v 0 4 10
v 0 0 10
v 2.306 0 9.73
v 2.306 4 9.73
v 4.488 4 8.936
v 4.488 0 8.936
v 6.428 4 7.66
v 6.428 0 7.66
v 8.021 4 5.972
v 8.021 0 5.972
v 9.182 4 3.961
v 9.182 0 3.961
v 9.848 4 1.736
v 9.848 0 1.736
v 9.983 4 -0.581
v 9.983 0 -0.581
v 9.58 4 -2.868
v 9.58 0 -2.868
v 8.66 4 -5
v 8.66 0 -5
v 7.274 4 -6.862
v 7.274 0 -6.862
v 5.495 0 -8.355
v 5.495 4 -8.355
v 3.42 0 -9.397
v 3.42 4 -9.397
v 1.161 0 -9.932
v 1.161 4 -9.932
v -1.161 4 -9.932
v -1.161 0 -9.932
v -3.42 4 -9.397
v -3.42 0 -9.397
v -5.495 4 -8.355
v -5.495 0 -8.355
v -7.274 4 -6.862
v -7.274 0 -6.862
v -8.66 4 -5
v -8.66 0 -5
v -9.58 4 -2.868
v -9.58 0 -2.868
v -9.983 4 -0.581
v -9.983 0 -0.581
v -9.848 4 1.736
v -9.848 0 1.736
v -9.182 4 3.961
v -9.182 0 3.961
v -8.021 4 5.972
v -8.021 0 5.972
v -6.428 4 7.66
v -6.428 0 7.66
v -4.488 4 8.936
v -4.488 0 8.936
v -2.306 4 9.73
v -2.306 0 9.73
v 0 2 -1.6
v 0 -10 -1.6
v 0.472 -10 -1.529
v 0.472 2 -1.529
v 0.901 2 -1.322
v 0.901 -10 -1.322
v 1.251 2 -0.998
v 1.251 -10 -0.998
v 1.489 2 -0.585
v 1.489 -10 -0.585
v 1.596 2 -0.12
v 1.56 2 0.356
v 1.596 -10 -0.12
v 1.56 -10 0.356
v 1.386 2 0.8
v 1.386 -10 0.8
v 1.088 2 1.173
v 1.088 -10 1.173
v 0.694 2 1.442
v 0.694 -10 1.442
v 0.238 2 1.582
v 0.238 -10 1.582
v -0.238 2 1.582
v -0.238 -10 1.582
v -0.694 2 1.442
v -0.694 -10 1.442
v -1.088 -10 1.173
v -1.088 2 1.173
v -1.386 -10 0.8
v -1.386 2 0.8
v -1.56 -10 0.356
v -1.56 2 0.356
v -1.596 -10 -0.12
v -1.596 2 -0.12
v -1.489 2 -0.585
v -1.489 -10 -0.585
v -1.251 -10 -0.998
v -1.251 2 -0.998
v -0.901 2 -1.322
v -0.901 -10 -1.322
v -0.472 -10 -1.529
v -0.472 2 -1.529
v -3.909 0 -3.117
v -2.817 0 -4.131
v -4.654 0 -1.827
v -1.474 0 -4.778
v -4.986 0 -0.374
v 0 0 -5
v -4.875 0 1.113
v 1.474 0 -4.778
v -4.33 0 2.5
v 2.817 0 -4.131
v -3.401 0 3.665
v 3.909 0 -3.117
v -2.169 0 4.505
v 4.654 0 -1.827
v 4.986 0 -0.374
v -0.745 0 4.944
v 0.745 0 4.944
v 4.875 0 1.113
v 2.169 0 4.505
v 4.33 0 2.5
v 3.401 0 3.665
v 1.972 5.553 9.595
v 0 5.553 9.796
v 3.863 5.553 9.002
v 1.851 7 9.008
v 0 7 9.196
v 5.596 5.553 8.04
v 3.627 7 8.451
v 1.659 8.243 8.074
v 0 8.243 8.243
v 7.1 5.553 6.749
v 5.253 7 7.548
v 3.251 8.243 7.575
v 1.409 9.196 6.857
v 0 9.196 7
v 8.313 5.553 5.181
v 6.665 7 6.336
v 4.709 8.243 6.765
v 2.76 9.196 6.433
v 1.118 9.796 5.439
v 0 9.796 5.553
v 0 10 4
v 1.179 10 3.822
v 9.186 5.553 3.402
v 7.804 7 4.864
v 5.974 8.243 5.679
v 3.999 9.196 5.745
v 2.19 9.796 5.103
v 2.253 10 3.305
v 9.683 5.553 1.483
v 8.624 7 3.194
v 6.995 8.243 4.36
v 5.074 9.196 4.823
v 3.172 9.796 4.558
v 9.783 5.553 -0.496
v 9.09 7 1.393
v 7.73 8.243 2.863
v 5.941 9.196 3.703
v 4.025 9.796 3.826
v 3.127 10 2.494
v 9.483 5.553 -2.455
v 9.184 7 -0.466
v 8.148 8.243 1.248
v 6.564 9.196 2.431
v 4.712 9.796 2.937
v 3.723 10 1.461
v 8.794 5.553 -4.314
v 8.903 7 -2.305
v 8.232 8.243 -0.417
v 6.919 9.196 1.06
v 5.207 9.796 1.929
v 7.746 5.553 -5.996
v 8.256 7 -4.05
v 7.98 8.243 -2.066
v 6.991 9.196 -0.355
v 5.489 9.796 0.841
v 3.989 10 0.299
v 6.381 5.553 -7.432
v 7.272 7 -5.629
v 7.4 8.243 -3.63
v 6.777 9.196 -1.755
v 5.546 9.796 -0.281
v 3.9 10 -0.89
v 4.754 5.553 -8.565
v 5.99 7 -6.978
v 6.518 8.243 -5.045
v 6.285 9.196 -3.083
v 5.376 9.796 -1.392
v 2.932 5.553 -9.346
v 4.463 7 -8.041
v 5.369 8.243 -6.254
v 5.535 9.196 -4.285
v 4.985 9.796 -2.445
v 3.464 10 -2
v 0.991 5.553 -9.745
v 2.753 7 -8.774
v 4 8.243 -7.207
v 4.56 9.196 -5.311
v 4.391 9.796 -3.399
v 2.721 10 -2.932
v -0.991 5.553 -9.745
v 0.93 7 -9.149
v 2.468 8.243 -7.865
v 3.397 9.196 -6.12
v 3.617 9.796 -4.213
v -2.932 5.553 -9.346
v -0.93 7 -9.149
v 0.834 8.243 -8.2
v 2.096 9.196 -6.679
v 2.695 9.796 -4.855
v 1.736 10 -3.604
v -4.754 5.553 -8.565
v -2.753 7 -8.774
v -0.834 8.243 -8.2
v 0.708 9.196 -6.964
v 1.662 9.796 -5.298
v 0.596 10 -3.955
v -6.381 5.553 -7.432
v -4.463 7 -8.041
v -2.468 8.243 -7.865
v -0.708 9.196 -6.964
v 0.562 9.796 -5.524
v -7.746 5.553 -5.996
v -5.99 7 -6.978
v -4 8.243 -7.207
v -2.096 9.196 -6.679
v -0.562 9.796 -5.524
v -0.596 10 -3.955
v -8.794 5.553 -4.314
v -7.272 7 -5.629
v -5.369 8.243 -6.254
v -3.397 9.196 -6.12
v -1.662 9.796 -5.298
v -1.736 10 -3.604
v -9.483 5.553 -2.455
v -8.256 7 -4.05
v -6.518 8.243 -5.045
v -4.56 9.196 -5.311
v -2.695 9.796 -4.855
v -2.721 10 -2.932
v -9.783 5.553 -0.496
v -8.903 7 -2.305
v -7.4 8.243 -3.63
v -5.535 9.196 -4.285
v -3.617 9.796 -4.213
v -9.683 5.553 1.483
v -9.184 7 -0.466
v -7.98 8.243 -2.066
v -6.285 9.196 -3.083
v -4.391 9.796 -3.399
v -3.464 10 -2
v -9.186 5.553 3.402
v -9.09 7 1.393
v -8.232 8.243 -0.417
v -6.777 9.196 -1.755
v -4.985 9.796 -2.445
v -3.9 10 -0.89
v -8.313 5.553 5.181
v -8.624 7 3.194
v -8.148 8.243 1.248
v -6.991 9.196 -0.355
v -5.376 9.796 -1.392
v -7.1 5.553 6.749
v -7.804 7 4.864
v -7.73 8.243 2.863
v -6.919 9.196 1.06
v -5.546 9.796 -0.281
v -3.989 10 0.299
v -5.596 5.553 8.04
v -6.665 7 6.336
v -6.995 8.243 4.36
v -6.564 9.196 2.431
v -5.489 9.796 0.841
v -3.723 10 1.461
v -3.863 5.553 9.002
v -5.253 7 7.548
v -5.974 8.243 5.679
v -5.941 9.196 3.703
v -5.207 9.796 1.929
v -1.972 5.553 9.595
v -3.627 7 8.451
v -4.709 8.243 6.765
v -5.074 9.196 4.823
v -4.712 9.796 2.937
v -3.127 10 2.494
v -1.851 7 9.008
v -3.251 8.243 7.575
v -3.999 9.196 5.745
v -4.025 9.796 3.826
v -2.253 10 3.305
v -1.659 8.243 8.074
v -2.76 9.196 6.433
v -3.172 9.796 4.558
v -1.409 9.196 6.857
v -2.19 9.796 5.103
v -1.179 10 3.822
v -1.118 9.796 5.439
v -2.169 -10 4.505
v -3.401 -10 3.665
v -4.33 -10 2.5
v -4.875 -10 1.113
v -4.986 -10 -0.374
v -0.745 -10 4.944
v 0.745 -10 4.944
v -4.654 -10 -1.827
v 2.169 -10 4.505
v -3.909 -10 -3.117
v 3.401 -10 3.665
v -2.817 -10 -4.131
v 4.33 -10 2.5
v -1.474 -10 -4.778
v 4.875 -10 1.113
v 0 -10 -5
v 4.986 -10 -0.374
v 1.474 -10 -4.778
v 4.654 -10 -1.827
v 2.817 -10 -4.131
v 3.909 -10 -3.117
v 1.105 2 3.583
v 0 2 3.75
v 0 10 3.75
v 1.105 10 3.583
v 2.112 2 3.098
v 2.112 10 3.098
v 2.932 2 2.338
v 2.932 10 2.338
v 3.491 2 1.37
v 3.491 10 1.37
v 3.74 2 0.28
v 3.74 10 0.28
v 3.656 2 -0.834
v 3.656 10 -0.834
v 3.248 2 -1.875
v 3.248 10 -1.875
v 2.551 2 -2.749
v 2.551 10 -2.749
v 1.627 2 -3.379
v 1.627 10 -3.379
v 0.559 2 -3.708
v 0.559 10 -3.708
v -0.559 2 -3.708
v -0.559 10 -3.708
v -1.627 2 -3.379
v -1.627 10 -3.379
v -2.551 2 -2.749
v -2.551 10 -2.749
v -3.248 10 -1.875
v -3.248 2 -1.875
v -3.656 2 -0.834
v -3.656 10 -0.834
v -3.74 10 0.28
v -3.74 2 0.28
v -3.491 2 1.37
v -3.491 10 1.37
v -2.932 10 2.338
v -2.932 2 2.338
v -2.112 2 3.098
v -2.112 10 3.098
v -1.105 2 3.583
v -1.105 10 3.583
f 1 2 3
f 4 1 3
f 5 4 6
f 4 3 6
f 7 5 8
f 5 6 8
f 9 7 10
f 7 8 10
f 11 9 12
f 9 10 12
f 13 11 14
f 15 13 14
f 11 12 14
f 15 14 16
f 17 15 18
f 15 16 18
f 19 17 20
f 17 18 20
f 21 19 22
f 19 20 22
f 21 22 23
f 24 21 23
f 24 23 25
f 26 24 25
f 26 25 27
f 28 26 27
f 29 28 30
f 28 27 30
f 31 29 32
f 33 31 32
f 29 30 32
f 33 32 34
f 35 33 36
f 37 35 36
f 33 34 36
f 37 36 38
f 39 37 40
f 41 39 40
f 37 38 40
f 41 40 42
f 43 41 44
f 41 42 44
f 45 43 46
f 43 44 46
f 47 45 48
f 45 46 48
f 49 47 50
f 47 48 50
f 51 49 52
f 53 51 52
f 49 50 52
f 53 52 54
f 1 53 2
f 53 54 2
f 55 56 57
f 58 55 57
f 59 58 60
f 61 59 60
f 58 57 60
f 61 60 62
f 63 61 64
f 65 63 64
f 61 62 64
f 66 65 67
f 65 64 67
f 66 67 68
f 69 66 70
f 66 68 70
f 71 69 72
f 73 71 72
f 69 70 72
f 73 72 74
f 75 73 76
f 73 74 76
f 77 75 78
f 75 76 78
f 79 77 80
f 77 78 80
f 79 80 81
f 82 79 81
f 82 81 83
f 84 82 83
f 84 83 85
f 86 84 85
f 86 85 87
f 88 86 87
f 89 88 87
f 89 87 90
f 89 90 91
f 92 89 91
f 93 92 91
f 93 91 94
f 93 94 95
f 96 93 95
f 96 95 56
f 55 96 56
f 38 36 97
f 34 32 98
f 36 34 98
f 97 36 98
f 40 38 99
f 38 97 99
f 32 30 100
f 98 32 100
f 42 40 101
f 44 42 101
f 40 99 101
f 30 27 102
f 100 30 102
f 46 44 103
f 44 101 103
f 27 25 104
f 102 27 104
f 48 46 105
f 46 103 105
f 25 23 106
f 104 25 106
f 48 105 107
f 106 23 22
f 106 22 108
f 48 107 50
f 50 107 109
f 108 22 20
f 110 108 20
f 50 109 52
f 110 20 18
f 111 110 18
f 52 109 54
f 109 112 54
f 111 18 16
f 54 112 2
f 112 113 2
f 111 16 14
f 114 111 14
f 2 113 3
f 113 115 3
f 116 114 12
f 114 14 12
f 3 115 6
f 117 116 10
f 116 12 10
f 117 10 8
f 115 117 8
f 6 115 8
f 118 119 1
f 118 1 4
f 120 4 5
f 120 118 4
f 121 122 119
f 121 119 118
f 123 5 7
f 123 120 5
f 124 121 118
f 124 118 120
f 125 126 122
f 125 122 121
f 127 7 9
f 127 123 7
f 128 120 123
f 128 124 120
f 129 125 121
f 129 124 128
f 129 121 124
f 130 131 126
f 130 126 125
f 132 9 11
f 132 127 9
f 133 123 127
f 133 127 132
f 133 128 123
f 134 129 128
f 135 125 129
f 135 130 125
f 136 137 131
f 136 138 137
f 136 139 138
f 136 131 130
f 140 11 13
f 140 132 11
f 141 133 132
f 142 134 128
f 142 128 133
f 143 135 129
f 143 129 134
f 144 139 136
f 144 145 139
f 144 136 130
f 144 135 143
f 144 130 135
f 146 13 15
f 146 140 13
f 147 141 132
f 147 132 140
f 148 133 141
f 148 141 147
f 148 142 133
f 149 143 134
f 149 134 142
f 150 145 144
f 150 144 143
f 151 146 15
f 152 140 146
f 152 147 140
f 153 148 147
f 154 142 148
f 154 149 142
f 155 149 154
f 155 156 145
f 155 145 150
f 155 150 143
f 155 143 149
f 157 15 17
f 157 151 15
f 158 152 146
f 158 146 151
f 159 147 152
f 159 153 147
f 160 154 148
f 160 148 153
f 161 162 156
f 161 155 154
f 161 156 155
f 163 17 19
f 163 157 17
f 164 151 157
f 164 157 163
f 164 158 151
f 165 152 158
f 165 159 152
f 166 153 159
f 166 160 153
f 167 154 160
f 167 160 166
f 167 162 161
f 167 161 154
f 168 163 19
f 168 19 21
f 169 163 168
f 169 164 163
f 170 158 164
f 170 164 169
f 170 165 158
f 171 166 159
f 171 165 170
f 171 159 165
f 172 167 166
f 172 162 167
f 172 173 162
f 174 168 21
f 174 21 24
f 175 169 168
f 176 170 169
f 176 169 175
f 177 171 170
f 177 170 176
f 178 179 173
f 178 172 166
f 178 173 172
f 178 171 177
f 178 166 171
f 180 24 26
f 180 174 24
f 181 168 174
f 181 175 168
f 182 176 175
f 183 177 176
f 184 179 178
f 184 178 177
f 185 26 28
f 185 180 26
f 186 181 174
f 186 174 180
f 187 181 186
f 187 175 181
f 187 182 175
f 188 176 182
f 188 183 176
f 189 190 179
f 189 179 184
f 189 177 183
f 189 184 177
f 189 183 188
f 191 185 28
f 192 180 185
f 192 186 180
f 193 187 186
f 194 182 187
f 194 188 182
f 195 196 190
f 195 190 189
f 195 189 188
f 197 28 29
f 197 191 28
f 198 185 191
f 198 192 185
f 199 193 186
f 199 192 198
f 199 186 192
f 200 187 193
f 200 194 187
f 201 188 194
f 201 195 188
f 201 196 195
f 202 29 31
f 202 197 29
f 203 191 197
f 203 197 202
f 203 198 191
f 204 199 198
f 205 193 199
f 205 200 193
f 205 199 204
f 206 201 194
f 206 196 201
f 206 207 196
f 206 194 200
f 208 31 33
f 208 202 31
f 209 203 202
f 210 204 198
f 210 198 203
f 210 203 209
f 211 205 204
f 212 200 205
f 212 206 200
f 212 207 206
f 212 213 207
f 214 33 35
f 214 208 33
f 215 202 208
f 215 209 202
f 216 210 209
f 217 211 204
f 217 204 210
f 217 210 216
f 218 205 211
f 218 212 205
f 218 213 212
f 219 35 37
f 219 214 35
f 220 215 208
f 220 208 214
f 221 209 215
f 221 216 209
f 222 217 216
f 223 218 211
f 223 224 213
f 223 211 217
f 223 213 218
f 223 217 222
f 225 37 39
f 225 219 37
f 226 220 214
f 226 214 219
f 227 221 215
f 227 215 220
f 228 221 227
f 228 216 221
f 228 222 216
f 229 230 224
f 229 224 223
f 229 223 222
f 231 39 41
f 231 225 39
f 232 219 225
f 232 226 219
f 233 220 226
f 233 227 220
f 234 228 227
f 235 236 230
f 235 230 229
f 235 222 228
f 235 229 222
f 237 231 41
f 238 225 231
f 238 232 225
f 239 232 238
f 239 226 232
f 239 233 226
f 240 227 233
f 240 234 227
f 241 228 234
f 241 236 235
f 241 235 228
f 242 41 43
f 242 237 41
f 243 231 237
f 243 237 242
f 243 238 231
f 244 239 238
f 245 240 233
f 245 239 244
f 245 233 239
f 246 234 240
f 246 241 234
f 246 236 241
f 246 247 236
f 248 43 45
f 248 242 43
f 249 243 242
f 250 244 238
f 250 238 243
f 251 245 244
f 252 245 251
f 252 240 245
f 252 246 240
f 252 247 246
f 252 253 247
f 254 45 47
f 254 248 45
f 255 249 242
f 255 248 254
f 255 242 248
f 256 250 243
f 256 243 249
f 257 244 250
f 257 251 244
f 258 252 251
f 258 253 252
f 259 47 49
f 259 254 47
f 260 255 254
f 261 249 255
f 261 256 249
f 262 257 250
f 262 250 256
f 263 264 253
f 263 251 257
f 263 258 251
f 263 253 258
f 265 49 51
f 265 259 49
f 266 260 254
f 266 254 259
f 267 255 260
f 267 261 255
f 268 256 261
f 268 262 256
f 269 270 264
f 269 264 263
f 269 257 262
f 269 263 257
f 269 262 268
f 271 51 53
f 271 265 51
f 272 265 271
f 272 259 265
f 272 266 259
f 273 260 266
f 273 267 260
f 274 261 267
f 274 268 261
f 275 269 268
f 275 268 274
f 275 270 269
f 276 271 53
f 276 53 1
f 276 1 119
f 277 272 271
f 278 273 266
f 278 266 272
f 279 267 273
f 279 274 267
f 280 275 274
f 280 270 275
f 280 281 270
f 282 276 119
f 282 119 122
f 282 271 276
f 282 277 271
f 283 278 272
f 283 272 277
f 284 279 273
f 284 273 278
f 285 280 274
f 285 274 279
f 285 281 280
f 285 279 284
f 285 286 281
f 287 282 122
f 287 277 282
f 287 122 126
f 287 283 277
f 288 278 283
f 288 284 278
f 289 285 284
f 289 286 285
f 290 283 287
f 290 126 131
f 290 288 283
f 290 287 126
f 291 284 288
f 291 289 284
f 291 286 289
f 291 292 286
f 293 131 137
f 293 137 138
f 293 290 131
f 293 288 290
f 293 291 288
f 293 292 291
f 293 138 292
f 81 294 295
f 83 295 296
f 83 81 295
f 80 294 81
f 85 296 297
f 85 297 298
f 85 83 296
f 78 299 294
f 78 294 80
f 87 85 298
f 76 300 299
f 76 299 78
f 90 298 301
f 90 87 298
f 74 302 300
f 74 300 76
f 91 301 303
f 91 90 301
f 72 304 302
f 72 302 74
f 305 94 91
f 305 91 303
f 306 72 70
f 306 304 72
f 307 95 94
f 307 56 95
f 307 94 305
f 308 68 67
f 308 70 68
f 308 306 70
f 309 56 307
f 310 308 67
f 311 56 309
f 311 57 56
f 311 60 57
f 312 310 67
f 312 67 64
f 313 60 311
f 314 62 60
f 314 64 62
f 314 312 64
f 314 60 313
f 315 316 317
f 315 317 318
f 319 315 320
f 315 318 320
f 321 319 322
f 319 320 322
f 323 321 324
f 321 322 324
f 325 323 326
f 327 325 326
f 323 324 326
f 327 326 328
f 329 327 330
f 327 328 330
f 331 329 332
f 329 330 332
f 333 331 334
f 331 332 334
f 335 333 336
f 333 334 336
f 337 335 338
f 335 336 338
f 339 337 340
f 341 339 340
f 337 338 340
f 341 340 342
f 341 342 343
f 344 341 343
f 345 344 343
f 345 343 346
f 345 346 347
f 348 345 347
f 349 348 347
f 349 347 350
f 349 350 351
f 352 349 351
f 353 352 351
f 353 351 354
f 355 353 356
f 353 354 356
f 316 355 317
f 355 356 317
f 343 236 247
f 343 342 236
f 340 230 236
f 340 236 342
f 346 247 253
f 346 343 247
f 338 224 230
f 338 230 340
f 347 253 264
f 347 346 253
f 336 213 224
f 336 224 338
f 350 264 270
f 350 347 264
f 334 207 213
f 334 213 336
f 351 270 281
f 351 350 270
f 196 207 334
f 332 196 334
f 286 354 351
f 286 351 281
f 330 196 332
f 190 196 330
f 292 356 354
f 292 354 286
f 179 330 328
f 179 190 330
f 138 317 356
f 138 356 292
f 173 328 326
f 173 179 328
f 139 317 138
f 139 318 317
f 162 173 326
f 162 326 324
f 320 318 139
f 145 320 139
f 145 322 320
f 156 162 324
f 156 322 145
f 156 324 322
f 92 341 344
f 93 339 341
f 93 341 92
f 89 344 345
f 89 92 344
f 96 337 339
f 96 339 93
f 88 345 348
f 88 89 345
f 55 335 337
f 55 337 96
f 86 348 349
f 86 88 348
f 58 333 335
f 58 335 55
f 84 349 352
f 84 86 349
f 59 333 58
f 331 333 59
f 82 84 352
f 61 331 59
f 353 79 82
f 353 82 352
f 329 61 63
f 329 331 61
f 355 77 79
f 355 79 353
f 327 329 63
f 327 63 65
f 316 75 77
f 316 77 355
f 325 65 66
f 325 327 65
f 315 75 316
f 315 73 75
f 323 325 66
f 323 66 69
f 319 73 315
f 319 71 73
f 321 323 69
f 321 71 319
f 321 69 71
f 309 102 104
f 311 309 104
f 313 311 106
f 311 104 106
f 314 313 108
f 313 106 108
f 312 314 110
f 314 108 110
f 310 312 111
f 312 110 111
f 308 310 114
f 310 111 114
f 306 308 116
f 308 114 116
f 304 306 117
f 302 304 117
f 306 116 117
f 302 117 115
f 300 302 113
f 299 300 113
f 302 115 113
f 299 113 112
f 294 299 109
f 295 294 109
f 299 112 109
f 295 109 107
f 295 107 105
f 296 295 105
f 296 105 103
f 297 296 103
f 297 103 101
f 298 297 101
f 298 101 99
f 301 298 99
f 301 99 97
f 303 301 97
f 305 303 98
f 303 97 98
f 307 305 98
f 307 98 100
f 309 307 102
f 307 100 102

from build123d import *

# Parameters (mm, degrees)
SZKIC1_R                    = 10
DODANIE_WYCI_GNI_CIE1_DEPTH = 10
ZAOKR_GLENIE1_R             = 6
SZKIC2_R                    = 5
DODANIE_WYCI_GNI_CIE2_DEPTH = 10
SZKIC3_R                    = 3.75
WYTNIJ_WYCI_GNI_CIE1_DEPTH  = 8
WYTNIJ_WYCI_GNI_CIE2_REACH  = 26.495
SZKIC4_R                    = 1.6


with BuildPart() as part:
    # Szkic1 → Dodanie-wyciągnięcie1 (new body)
    with BuildSketch(Plane(origin=(0, 0, 0), x_dir=(1, 0, 0), z_dir=(0, 1, 0))):
        with Locations(Location((0, 0, 0), (0, 0, 270))):
            Circle(SZKIC1_R)
    extrude(amount=DODANIE_WYCI_GNI_CIE1_DEPTH)

    # Zaokrąglenie1
    zaokr_glenie1_edges = [part.edges().sort_by_distance(p)[0] for p in [
        (0, 10, -10),
    ]]
    fillet(zaokr_glenie1_edges, radius=ZAOKR_GLENIE1_R)

    # Szkic2 → Dodanie-wyciągnięcie2 (add)
    with BuildSketch(Plane.XZ):
        with Locations(Location((0, 0, 0), (0, 0, 270))):
            Circle(SZKIC2_R)
    extrude(amount=DODANIE_WYCI_GNI_CIE2_DEPTH)

    # Szkic3 → Wytnij-wyciągnięcie1 (cut)
    with BuildSketch(Plane(origin=(0, 10, 0), x_dir=(1, 0, 0), z_dir=(0, 1, 0))):
        with Locations(Location((0, 0, 0), (0, 0, 270))):
            Circle(SZKIC3_R)
    extrude(amount=-WYTNIJ_WYCI_GNI_CIE1_DEPTH, mode=Mode.SUBTRACT)

    # Szkic4 → Wytnij-wyciągnięcie2 (cut, up to next)
    with BuildSketch(Plane.XZ.offset(10), mode=Mode.PRIVATE) as wytnij_wyci_gni_cie2_sk1:
        with Locations(Location((0, 0, 0), (0, 0, 270))):
            Circle(SZKIC4_R)
    wytnij_wyci_gni_cie2_tool1 = extrude(wytnij_wyci_gni_cie2_sk1.sketch, amount=-WYTNIJ_WYCI_GNI_CIE2_REACH, mode=Mode.PRIVATE) & part.part
    add(wytnij_wyci_gni_cie2_tool1.solids().sort_by_distance((0, -10, 0))[0], mode=Mode.SUBTRACT)


solid = part.part
